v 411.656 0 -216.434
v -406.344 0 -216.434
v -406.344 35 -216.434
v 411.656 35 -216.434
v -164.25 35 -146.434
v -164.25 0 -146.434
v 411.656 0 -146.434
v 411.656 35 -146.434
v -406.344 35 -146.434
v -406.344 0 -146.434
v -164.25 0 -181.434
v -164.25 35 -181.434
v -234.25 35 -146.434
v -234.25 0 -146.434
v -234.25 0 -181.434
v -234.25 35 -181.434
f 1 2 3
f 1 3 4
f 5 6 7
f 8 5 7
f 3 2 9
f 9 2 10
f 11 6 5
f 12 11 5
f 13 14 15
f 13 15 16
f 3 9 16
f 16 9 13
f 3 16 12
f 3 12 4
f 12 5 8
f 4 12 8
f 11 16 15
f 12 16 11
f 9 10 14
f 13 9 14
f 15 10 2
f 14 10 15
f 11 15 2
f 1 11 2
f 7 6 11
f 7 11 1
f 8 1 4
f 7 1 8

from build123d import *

# Parameters (mm, degrees)
F0_W     = 818
F0_H     = 70
F1_DEPTH = 35
F2_W     = 70
F2_H     = 35
F3_DEPTH = 35


with BuildPart() as f1:
    # F0 (on Front) → F1 (new body)
    with BuildSketch(Plane.XZ):
        with Locations((2.655625, -181.434033)):
            Rectangle(F0_W, F0_H)
    extrude(amount=-F1_DEPTH)

    # F2 (on face) → F3 (cut)
    with BuildSketch(Plane.XY.offset(-146.434033)):
        with Locations((-199.250098, 17.5)):
            Rectangle(F2_W, F2_H)
    extrude(amount=-F3_DEPTH, mode=Mode.SUBTRACT)


solid = f1.part
